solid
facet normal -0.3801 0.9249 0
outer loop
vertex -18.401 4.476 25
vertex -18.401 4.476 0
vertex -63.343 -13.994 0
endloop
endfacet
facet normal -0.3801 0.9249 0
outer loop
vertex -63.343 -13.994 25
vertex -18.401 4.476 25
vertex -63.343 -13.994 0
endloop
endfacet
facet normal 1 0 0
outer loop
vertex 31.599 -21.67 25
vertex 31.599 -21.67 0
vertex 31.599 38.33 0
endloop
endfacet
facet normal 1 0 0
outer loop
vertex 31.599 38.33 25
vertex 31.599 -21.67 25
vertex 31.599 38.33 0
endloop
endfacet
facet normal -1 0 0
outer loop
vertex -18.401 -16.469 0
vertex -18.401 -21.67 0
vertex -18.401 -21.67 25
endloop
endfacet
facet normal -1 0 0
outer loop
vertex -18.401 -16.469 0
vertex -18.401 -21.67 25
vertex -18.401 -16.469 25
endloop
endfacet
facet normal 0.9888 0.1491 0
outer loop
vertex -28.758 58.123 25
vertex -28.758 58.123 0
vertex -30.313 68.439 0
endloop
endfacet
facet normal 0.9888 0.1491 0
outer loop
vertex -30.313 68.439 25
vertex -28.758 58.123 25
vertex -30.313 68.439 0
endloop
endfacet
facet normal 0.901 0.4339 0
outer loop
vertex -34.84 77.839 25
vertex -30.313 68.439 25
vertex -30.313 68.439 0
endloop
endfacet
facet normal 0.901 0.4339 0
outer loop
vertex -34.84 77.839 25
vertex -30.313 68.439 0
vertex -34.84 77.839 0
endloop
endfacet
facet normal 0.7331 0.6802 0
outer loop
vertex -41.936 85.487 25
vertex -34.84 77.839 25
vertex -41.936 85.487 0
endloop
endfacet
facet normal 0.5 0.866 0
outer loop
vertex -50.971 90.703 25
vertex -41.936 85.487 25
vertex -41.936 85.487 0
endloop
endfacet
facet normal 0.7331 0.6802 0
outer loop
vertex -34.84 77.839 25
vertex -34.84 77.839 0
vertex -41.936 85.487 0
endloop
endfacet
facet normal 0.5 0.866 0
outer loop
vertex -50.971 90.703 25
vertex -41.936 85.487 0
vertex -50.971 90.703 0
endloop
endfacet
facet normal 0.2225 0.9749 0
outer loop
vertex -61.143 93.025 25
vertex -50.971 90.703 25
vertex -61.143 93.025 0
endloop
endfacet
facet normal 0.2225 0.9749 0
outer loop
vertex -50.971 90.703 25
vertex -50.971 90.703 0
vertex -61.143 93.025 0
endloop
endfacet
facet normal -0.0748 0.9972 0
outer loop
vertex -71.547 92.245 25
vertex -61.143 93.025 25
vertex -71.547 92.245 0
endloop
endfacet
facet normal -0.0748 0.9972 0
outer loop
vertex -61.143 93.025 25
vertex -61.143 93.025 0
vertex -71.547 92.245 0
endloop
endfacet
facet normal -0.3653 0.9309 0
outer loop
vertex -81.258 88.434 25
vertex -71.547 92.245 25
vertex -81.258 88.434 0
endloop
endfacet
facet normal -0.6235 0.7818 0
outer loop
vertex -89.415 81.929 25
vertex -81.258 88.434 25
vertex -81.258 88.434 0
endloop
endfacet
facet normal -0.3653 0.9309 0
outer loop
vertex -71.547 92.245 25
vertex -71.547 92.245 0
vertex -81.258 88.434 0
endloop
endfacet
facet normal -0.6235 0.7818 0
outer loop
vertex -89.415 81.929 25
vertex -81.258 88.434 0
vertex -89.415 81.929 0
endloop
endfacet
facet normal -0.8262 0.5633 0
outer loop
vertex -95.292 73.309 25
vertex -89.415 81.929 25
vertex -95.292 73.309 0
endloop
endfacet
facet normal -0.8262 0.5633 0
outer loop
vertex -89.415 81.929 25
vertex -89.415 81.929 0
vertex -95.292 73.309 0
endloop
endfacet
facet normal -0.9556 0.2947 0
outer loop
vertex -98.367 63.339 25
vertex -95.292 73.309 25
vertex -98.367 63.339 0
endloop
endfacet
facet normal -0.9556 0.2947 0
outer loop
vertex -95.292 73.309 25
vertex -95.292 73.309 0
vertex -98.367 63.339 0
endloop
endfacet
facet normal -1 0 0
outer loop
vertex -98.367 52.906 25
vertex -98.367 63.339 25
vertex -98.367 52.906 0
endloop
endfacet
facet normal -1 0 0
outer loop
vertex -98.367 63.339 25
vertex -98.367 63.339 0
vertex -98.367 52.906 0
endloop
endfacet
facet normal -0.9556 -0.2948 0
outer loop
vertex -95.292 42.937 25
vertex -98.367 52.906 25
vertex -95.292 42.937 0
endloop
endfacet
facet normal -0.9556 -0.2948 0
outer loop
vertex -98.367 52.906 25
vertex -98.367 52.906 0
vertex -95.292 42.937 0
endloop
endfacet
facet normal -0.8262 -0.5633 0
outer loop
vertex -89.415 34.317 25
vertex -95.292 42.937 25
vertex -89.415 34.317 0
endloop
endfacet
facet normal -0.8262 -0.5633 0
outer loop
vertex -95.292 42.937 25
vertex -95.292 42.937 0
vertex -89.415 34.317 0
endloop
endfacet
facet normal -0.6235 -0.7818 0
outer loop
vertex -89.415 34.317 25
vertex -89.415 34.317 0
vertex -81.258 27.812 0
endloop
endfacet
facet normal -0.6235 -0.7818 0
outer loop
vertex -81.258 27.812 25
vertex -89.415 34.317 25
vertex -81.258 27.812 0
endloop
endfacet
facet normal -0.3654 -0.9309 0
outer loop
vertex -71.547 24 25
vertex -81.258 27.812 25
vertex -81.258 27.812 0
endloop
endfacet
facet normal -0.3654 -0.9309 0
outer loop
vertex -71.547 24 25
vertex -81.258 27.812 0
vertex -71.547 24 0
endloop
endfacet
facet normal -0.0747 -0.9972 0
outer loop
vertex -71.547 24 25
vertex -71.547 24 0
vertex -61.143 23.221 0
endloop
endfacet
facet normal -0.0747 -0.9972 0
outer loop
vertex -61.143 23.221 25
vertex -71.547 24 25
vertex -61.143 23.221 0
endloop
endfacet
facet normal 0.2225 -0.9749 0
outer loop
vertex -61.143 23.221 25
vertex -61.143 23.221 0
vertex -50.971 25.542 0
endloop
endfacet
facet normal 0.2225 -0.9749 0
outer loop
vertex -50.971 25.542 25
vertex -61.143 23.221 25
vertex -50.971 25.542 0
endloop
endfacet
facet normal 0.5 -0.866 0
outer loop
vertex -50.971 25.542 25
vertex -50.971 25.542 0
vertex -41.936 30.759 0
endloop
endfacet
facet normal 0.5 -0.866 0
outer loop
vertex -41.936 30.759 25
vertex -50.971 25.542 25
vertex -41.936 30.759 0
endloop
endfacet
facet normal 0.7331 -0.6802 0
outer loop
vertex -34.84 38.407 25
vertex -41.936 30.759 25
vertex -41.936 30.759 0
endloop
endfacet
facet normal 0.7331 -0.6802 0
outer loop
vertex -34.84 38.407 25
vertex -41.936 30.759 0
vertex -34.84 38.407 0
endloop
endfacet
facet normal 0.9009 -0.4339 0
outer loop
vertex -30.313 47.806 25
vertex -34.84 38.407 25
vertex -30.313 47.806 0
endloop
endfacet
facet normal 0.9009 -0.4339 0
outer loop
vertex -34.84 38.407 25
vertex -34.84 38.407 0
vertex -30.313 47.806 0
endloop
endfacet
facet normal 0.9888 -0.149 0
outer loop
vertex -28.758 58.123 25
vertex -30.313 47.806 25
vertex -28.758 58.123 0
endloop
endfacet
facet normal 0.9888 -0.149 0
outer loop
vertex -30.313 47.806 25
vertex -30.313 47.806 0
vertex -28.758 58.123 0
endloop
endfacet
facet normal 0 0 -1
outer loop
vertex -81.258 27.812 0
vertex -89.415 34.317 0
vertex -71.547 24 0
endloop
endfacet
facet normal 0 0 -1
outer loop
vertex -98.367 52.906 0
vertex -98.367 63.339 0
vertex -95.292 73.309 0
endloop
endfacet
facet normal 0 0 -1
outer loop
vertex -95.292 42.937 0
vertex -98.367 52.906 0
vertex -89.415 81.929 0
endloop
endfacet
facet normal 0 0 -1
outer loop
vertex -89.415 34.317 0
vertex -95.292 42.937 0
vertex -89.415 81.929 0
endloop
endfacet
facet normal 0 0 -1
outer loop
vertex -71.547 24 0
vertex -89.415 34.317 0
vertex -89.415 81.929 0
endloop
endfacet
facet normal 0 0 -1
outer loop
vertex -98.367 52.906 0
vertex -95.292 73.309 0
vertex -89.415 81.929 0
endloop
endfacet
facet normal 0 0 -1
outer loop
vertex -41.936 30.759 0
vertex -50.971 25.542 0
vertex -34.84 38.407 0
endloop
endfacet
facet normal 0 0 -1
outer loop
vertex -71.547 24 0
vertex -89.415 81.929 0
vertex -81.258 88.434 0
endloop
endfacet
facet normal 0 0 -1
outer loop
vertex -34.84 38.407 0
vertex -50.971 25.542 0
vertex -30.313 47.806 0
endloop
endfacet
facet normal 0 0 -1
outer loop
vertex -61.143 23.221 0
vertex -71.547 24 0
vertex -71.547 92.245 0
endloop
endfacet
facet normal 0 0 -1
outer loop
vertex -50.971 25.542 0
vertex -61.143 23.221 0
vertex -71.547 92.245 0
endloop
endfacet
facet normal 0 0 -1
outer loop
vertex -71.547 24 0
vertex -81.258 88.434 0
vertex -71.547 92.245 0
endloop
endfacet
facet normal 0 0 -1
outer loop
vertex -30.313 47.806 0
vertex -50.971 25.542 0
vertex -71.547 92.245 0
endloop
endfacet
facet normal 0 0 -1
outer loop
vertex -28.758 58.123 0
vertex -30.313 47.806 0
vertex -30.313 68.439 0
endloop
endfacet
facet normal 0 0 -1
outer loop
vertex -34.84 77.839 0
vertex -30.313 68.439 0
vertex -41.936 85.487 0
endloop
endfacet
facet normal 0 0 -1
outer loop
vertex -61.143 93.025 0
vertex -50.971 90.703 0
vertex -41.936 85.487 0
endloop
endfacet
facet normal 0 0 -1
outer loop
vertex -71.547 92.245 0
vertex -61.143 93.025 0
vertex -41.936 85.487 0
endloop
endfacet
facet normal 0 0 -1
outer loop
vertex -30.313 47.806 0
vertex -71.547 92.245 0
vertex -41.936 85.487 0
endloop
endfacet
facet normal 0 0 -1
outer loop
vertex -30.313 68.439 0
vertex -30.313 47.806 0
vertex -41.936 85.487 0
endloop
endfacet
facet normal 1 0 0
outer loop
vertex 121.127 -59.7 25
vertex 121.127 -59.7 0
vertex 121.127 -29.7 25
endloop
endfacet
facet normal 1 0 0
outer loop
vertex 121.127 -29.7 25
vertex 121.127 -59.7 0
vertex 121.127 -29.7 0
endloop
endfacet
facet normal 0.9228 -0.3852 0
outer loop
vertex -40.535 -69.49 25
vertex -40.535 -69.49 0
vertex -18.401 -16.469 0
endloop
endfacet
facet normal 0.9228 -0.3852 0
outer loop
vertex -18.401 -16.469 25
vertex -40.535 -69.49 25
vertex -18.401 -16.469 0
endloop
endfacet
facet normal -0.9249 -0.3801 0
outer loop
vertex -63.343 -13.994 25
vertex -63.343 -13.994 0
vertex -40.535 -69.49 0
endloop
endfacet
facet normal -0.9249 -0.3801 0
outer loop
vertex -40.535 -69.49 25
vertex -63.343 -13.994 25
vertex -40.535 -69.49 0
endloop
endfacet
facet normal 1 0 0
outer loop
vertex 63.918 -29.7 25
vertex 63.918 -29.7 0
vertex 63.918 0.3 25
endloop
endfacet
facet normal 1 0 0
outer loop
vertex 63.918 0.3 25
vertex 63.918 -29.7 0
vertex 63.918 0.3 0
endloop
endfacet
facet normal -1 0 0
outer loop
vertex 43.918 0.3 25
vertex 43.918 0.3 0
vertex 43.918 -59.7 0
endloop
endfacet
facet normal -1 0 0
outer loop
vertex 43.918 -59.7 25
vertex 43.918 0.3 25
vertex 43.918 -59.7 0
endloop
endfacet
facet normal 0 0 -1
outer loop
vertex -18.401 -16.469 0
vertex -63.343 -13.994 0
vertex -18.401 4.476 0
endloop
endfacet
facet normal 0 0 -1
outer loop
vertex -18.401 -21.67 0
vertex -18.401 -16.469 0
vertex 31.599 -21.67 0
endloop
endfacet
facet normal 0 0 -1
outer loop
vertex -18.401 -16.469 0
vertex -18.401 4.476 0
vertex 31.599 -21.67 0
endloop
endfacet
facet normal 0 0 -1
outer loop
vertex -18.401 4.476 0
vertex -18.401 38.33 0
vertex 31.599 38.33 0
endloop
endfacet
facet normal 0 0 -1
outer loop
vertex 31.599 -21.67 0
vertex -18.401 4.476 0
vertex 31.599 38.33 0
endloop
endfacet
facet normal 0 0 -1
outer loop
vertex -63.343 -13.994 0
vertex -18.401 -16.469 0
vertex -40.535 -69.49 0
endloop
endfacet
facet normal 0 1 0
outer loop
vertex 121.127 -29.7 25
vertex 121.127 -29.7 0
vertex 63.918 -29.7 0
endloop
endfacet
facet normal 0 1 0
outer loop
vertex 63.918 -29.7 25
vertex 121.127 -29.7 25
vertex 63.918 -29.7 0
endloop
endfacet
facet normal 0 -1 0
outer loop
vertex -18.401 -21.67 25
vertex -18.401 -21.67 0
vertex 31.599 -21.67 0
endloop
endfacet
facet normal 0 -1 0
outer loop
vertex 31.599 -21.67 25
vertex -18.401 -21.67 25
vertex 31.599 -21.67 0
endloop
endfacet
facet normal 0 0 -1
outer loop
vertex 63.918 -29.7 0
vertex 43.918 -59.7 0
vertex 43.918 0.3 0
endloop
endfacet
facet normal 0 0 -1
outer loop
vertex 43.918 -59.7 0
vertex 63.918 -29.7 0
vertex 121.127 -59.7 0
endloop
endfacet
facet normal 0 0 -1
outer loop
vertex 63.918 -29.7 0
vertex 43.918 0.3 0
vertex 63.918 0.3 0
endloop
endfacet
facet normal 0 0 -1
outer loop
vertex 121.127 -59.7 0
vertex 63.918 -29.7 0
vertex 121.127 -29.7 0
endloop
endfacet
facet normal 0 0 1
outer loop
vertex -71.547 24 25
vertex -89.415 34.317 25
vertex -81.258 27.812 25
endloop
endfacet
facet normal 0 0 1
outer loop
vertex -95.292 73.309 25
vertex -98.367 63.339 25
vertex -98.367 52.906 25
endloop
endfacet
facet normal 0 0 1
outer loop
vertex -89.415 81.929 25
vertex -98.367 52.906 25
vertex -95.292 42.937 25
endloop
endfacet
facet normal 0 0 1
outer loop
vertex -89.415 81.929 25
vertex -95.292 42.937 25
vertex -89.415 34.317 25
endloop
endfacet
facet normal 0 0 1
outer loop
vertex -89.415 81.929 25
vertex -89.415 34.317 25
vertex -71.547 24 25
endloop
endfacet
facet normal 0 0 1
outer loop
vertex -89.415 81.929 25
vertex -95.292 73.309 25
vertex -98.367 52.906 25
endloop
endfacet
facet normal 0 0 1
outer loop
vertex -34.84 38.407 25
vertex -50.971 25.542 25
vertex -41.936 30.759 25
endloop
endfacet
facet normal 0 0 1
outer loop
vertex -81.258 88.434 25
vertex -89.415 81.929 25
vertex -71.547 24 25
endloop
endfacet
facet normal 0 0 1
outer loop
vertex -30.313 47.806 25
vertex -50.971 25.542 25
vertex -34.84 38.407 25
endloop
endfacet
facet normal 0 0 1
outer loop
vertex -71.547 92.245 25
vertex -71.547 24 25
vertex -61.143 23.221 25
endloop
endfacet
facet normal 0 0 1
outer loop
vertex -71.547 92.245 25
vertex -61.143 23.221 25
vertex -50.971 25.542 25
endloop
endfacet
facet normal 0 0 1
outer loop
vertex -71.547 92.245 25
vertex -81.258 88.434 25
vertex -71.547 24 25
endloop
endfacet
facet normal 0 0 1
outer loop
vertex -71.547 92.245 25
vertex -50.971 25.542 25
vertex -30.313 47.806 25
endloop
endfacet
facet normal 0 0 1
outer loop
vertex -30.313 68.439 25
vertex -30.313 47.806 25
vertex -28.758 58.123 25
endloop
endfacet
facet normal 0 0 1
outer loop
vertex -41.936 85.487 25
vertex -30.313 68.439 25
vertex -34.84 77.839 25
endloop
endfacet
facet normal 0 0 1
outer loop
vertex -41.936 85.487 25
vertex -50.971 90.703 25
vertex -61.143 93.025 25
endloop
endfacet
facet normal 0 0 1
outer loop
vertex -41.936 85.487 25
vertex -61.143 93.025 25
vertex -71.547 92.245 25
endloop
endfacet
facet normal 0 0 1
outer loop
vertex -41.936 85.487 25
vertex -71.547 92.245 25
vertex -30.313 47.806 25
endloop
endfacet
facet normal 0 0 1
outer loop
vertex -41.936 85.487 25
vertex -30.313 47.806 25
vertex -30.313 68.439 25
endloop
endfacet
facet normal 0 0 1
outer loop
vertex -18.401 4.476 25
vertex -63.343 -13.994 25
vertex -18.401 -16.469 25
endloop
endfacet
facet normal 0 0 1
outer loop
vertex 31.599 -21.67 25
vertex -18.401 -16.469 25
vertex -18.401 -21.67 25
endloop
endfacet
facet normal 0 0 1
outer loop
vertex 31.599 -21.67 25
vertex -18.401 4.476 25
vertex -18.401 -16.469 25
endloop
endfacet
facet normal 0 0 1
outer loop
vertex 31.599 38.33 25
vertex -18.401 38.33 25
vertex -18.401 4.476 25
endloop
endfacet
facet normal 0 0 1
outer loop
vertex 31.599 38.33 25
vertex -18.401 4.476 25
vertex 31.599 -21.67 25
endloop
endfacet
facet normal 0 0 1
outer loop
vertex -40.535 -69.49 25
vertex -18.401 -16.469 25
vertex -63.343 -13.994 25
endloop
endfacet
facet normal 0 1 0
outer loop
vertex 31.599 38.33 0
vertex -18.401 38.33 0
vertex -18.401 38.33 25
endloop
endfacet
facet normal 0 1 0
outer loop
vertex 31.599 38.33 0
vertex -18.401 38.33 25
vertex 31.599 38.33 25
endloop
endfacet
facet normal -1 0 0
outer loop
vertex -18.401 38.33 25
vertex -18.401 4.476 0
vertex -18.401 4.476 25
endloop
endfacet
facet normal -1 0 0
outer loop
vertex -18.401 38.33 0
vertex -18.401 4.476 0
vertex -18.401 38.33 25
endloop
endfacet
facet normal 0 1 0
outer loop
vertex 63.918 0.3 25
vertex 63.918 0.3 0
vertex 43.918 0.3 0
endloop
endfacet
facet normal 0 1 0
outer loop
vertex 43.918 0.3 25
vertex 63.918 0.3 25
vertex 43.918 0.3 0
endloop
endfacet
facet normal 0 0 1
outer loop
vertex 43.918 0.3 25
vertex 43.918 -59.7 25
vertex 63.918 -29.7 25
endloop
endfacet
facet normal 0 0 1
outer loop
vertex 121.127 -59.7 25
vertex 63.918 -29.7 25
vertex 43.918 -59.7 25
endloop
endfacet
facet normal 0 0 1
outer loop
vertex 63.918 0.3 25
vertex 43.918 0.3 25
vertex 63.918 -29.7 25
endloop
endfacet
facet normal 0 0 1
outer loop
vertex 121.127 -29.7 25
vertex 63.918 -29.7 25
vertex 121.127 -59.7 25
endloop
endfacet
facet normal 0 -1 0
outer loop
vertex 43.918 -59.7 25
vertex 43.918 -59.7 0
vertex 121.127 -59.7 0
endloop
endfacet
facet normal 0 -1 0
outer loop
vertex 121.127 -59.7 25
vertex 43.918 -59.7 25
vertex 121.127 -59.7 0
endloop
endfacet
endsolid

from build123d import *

# Parameters (mm, degrees)
F2_R     = 35
F4_DEPTH = 25
F0_W     = 50
F0_H     = 60
F5_DEPTH = 25
F6_DEPTH = 25
F7_DEPTH = 25


with BuildPart() as f4:
    # F2 (on Top) → F4 (new body)
    with BuildSketch(Plane.XY):
        with Locations((-63.758358, 58.122706)):
            Circle(F2_R)
    extrude(amount=F4_DEPTH)


with BuildPart() as f5:
    # F0 (on Top) → F5 (new body)
    with BuildSketch(Plane.XY):
        with Locations((6.598763, 8.329774)):
            Rectangle(F0_W, F0_H)
    extrude(amount=F5_DEPTH)

    # F1 (on Top) → F6 (join)
    with BuildSketch(Plane.XY):
        Polygon((-63.342893, -13.994213), (-40.534549, -69.489974), (-7.847132, 8.81413), align=None)
    extrude(amount=F6_DEPTH)


with BuildPart() as f7:
    # F3 (on Top) → F7 (new body)
    with BuildSketch(Plane.XY):
        Polygon((63.917592, 0.299875), (43.917592, 0.299875), (43.917592, -59.700125), (61.126889, -59.700125), (63.917592, -59.700125), (121.126889, -59.700125), (121.126889, -29.700125), (63.917592, -29.700125), align=None)
    extrude(amount=F7_DEPTH)


solid = Compound([f4.part, f5.part, f7.part])
